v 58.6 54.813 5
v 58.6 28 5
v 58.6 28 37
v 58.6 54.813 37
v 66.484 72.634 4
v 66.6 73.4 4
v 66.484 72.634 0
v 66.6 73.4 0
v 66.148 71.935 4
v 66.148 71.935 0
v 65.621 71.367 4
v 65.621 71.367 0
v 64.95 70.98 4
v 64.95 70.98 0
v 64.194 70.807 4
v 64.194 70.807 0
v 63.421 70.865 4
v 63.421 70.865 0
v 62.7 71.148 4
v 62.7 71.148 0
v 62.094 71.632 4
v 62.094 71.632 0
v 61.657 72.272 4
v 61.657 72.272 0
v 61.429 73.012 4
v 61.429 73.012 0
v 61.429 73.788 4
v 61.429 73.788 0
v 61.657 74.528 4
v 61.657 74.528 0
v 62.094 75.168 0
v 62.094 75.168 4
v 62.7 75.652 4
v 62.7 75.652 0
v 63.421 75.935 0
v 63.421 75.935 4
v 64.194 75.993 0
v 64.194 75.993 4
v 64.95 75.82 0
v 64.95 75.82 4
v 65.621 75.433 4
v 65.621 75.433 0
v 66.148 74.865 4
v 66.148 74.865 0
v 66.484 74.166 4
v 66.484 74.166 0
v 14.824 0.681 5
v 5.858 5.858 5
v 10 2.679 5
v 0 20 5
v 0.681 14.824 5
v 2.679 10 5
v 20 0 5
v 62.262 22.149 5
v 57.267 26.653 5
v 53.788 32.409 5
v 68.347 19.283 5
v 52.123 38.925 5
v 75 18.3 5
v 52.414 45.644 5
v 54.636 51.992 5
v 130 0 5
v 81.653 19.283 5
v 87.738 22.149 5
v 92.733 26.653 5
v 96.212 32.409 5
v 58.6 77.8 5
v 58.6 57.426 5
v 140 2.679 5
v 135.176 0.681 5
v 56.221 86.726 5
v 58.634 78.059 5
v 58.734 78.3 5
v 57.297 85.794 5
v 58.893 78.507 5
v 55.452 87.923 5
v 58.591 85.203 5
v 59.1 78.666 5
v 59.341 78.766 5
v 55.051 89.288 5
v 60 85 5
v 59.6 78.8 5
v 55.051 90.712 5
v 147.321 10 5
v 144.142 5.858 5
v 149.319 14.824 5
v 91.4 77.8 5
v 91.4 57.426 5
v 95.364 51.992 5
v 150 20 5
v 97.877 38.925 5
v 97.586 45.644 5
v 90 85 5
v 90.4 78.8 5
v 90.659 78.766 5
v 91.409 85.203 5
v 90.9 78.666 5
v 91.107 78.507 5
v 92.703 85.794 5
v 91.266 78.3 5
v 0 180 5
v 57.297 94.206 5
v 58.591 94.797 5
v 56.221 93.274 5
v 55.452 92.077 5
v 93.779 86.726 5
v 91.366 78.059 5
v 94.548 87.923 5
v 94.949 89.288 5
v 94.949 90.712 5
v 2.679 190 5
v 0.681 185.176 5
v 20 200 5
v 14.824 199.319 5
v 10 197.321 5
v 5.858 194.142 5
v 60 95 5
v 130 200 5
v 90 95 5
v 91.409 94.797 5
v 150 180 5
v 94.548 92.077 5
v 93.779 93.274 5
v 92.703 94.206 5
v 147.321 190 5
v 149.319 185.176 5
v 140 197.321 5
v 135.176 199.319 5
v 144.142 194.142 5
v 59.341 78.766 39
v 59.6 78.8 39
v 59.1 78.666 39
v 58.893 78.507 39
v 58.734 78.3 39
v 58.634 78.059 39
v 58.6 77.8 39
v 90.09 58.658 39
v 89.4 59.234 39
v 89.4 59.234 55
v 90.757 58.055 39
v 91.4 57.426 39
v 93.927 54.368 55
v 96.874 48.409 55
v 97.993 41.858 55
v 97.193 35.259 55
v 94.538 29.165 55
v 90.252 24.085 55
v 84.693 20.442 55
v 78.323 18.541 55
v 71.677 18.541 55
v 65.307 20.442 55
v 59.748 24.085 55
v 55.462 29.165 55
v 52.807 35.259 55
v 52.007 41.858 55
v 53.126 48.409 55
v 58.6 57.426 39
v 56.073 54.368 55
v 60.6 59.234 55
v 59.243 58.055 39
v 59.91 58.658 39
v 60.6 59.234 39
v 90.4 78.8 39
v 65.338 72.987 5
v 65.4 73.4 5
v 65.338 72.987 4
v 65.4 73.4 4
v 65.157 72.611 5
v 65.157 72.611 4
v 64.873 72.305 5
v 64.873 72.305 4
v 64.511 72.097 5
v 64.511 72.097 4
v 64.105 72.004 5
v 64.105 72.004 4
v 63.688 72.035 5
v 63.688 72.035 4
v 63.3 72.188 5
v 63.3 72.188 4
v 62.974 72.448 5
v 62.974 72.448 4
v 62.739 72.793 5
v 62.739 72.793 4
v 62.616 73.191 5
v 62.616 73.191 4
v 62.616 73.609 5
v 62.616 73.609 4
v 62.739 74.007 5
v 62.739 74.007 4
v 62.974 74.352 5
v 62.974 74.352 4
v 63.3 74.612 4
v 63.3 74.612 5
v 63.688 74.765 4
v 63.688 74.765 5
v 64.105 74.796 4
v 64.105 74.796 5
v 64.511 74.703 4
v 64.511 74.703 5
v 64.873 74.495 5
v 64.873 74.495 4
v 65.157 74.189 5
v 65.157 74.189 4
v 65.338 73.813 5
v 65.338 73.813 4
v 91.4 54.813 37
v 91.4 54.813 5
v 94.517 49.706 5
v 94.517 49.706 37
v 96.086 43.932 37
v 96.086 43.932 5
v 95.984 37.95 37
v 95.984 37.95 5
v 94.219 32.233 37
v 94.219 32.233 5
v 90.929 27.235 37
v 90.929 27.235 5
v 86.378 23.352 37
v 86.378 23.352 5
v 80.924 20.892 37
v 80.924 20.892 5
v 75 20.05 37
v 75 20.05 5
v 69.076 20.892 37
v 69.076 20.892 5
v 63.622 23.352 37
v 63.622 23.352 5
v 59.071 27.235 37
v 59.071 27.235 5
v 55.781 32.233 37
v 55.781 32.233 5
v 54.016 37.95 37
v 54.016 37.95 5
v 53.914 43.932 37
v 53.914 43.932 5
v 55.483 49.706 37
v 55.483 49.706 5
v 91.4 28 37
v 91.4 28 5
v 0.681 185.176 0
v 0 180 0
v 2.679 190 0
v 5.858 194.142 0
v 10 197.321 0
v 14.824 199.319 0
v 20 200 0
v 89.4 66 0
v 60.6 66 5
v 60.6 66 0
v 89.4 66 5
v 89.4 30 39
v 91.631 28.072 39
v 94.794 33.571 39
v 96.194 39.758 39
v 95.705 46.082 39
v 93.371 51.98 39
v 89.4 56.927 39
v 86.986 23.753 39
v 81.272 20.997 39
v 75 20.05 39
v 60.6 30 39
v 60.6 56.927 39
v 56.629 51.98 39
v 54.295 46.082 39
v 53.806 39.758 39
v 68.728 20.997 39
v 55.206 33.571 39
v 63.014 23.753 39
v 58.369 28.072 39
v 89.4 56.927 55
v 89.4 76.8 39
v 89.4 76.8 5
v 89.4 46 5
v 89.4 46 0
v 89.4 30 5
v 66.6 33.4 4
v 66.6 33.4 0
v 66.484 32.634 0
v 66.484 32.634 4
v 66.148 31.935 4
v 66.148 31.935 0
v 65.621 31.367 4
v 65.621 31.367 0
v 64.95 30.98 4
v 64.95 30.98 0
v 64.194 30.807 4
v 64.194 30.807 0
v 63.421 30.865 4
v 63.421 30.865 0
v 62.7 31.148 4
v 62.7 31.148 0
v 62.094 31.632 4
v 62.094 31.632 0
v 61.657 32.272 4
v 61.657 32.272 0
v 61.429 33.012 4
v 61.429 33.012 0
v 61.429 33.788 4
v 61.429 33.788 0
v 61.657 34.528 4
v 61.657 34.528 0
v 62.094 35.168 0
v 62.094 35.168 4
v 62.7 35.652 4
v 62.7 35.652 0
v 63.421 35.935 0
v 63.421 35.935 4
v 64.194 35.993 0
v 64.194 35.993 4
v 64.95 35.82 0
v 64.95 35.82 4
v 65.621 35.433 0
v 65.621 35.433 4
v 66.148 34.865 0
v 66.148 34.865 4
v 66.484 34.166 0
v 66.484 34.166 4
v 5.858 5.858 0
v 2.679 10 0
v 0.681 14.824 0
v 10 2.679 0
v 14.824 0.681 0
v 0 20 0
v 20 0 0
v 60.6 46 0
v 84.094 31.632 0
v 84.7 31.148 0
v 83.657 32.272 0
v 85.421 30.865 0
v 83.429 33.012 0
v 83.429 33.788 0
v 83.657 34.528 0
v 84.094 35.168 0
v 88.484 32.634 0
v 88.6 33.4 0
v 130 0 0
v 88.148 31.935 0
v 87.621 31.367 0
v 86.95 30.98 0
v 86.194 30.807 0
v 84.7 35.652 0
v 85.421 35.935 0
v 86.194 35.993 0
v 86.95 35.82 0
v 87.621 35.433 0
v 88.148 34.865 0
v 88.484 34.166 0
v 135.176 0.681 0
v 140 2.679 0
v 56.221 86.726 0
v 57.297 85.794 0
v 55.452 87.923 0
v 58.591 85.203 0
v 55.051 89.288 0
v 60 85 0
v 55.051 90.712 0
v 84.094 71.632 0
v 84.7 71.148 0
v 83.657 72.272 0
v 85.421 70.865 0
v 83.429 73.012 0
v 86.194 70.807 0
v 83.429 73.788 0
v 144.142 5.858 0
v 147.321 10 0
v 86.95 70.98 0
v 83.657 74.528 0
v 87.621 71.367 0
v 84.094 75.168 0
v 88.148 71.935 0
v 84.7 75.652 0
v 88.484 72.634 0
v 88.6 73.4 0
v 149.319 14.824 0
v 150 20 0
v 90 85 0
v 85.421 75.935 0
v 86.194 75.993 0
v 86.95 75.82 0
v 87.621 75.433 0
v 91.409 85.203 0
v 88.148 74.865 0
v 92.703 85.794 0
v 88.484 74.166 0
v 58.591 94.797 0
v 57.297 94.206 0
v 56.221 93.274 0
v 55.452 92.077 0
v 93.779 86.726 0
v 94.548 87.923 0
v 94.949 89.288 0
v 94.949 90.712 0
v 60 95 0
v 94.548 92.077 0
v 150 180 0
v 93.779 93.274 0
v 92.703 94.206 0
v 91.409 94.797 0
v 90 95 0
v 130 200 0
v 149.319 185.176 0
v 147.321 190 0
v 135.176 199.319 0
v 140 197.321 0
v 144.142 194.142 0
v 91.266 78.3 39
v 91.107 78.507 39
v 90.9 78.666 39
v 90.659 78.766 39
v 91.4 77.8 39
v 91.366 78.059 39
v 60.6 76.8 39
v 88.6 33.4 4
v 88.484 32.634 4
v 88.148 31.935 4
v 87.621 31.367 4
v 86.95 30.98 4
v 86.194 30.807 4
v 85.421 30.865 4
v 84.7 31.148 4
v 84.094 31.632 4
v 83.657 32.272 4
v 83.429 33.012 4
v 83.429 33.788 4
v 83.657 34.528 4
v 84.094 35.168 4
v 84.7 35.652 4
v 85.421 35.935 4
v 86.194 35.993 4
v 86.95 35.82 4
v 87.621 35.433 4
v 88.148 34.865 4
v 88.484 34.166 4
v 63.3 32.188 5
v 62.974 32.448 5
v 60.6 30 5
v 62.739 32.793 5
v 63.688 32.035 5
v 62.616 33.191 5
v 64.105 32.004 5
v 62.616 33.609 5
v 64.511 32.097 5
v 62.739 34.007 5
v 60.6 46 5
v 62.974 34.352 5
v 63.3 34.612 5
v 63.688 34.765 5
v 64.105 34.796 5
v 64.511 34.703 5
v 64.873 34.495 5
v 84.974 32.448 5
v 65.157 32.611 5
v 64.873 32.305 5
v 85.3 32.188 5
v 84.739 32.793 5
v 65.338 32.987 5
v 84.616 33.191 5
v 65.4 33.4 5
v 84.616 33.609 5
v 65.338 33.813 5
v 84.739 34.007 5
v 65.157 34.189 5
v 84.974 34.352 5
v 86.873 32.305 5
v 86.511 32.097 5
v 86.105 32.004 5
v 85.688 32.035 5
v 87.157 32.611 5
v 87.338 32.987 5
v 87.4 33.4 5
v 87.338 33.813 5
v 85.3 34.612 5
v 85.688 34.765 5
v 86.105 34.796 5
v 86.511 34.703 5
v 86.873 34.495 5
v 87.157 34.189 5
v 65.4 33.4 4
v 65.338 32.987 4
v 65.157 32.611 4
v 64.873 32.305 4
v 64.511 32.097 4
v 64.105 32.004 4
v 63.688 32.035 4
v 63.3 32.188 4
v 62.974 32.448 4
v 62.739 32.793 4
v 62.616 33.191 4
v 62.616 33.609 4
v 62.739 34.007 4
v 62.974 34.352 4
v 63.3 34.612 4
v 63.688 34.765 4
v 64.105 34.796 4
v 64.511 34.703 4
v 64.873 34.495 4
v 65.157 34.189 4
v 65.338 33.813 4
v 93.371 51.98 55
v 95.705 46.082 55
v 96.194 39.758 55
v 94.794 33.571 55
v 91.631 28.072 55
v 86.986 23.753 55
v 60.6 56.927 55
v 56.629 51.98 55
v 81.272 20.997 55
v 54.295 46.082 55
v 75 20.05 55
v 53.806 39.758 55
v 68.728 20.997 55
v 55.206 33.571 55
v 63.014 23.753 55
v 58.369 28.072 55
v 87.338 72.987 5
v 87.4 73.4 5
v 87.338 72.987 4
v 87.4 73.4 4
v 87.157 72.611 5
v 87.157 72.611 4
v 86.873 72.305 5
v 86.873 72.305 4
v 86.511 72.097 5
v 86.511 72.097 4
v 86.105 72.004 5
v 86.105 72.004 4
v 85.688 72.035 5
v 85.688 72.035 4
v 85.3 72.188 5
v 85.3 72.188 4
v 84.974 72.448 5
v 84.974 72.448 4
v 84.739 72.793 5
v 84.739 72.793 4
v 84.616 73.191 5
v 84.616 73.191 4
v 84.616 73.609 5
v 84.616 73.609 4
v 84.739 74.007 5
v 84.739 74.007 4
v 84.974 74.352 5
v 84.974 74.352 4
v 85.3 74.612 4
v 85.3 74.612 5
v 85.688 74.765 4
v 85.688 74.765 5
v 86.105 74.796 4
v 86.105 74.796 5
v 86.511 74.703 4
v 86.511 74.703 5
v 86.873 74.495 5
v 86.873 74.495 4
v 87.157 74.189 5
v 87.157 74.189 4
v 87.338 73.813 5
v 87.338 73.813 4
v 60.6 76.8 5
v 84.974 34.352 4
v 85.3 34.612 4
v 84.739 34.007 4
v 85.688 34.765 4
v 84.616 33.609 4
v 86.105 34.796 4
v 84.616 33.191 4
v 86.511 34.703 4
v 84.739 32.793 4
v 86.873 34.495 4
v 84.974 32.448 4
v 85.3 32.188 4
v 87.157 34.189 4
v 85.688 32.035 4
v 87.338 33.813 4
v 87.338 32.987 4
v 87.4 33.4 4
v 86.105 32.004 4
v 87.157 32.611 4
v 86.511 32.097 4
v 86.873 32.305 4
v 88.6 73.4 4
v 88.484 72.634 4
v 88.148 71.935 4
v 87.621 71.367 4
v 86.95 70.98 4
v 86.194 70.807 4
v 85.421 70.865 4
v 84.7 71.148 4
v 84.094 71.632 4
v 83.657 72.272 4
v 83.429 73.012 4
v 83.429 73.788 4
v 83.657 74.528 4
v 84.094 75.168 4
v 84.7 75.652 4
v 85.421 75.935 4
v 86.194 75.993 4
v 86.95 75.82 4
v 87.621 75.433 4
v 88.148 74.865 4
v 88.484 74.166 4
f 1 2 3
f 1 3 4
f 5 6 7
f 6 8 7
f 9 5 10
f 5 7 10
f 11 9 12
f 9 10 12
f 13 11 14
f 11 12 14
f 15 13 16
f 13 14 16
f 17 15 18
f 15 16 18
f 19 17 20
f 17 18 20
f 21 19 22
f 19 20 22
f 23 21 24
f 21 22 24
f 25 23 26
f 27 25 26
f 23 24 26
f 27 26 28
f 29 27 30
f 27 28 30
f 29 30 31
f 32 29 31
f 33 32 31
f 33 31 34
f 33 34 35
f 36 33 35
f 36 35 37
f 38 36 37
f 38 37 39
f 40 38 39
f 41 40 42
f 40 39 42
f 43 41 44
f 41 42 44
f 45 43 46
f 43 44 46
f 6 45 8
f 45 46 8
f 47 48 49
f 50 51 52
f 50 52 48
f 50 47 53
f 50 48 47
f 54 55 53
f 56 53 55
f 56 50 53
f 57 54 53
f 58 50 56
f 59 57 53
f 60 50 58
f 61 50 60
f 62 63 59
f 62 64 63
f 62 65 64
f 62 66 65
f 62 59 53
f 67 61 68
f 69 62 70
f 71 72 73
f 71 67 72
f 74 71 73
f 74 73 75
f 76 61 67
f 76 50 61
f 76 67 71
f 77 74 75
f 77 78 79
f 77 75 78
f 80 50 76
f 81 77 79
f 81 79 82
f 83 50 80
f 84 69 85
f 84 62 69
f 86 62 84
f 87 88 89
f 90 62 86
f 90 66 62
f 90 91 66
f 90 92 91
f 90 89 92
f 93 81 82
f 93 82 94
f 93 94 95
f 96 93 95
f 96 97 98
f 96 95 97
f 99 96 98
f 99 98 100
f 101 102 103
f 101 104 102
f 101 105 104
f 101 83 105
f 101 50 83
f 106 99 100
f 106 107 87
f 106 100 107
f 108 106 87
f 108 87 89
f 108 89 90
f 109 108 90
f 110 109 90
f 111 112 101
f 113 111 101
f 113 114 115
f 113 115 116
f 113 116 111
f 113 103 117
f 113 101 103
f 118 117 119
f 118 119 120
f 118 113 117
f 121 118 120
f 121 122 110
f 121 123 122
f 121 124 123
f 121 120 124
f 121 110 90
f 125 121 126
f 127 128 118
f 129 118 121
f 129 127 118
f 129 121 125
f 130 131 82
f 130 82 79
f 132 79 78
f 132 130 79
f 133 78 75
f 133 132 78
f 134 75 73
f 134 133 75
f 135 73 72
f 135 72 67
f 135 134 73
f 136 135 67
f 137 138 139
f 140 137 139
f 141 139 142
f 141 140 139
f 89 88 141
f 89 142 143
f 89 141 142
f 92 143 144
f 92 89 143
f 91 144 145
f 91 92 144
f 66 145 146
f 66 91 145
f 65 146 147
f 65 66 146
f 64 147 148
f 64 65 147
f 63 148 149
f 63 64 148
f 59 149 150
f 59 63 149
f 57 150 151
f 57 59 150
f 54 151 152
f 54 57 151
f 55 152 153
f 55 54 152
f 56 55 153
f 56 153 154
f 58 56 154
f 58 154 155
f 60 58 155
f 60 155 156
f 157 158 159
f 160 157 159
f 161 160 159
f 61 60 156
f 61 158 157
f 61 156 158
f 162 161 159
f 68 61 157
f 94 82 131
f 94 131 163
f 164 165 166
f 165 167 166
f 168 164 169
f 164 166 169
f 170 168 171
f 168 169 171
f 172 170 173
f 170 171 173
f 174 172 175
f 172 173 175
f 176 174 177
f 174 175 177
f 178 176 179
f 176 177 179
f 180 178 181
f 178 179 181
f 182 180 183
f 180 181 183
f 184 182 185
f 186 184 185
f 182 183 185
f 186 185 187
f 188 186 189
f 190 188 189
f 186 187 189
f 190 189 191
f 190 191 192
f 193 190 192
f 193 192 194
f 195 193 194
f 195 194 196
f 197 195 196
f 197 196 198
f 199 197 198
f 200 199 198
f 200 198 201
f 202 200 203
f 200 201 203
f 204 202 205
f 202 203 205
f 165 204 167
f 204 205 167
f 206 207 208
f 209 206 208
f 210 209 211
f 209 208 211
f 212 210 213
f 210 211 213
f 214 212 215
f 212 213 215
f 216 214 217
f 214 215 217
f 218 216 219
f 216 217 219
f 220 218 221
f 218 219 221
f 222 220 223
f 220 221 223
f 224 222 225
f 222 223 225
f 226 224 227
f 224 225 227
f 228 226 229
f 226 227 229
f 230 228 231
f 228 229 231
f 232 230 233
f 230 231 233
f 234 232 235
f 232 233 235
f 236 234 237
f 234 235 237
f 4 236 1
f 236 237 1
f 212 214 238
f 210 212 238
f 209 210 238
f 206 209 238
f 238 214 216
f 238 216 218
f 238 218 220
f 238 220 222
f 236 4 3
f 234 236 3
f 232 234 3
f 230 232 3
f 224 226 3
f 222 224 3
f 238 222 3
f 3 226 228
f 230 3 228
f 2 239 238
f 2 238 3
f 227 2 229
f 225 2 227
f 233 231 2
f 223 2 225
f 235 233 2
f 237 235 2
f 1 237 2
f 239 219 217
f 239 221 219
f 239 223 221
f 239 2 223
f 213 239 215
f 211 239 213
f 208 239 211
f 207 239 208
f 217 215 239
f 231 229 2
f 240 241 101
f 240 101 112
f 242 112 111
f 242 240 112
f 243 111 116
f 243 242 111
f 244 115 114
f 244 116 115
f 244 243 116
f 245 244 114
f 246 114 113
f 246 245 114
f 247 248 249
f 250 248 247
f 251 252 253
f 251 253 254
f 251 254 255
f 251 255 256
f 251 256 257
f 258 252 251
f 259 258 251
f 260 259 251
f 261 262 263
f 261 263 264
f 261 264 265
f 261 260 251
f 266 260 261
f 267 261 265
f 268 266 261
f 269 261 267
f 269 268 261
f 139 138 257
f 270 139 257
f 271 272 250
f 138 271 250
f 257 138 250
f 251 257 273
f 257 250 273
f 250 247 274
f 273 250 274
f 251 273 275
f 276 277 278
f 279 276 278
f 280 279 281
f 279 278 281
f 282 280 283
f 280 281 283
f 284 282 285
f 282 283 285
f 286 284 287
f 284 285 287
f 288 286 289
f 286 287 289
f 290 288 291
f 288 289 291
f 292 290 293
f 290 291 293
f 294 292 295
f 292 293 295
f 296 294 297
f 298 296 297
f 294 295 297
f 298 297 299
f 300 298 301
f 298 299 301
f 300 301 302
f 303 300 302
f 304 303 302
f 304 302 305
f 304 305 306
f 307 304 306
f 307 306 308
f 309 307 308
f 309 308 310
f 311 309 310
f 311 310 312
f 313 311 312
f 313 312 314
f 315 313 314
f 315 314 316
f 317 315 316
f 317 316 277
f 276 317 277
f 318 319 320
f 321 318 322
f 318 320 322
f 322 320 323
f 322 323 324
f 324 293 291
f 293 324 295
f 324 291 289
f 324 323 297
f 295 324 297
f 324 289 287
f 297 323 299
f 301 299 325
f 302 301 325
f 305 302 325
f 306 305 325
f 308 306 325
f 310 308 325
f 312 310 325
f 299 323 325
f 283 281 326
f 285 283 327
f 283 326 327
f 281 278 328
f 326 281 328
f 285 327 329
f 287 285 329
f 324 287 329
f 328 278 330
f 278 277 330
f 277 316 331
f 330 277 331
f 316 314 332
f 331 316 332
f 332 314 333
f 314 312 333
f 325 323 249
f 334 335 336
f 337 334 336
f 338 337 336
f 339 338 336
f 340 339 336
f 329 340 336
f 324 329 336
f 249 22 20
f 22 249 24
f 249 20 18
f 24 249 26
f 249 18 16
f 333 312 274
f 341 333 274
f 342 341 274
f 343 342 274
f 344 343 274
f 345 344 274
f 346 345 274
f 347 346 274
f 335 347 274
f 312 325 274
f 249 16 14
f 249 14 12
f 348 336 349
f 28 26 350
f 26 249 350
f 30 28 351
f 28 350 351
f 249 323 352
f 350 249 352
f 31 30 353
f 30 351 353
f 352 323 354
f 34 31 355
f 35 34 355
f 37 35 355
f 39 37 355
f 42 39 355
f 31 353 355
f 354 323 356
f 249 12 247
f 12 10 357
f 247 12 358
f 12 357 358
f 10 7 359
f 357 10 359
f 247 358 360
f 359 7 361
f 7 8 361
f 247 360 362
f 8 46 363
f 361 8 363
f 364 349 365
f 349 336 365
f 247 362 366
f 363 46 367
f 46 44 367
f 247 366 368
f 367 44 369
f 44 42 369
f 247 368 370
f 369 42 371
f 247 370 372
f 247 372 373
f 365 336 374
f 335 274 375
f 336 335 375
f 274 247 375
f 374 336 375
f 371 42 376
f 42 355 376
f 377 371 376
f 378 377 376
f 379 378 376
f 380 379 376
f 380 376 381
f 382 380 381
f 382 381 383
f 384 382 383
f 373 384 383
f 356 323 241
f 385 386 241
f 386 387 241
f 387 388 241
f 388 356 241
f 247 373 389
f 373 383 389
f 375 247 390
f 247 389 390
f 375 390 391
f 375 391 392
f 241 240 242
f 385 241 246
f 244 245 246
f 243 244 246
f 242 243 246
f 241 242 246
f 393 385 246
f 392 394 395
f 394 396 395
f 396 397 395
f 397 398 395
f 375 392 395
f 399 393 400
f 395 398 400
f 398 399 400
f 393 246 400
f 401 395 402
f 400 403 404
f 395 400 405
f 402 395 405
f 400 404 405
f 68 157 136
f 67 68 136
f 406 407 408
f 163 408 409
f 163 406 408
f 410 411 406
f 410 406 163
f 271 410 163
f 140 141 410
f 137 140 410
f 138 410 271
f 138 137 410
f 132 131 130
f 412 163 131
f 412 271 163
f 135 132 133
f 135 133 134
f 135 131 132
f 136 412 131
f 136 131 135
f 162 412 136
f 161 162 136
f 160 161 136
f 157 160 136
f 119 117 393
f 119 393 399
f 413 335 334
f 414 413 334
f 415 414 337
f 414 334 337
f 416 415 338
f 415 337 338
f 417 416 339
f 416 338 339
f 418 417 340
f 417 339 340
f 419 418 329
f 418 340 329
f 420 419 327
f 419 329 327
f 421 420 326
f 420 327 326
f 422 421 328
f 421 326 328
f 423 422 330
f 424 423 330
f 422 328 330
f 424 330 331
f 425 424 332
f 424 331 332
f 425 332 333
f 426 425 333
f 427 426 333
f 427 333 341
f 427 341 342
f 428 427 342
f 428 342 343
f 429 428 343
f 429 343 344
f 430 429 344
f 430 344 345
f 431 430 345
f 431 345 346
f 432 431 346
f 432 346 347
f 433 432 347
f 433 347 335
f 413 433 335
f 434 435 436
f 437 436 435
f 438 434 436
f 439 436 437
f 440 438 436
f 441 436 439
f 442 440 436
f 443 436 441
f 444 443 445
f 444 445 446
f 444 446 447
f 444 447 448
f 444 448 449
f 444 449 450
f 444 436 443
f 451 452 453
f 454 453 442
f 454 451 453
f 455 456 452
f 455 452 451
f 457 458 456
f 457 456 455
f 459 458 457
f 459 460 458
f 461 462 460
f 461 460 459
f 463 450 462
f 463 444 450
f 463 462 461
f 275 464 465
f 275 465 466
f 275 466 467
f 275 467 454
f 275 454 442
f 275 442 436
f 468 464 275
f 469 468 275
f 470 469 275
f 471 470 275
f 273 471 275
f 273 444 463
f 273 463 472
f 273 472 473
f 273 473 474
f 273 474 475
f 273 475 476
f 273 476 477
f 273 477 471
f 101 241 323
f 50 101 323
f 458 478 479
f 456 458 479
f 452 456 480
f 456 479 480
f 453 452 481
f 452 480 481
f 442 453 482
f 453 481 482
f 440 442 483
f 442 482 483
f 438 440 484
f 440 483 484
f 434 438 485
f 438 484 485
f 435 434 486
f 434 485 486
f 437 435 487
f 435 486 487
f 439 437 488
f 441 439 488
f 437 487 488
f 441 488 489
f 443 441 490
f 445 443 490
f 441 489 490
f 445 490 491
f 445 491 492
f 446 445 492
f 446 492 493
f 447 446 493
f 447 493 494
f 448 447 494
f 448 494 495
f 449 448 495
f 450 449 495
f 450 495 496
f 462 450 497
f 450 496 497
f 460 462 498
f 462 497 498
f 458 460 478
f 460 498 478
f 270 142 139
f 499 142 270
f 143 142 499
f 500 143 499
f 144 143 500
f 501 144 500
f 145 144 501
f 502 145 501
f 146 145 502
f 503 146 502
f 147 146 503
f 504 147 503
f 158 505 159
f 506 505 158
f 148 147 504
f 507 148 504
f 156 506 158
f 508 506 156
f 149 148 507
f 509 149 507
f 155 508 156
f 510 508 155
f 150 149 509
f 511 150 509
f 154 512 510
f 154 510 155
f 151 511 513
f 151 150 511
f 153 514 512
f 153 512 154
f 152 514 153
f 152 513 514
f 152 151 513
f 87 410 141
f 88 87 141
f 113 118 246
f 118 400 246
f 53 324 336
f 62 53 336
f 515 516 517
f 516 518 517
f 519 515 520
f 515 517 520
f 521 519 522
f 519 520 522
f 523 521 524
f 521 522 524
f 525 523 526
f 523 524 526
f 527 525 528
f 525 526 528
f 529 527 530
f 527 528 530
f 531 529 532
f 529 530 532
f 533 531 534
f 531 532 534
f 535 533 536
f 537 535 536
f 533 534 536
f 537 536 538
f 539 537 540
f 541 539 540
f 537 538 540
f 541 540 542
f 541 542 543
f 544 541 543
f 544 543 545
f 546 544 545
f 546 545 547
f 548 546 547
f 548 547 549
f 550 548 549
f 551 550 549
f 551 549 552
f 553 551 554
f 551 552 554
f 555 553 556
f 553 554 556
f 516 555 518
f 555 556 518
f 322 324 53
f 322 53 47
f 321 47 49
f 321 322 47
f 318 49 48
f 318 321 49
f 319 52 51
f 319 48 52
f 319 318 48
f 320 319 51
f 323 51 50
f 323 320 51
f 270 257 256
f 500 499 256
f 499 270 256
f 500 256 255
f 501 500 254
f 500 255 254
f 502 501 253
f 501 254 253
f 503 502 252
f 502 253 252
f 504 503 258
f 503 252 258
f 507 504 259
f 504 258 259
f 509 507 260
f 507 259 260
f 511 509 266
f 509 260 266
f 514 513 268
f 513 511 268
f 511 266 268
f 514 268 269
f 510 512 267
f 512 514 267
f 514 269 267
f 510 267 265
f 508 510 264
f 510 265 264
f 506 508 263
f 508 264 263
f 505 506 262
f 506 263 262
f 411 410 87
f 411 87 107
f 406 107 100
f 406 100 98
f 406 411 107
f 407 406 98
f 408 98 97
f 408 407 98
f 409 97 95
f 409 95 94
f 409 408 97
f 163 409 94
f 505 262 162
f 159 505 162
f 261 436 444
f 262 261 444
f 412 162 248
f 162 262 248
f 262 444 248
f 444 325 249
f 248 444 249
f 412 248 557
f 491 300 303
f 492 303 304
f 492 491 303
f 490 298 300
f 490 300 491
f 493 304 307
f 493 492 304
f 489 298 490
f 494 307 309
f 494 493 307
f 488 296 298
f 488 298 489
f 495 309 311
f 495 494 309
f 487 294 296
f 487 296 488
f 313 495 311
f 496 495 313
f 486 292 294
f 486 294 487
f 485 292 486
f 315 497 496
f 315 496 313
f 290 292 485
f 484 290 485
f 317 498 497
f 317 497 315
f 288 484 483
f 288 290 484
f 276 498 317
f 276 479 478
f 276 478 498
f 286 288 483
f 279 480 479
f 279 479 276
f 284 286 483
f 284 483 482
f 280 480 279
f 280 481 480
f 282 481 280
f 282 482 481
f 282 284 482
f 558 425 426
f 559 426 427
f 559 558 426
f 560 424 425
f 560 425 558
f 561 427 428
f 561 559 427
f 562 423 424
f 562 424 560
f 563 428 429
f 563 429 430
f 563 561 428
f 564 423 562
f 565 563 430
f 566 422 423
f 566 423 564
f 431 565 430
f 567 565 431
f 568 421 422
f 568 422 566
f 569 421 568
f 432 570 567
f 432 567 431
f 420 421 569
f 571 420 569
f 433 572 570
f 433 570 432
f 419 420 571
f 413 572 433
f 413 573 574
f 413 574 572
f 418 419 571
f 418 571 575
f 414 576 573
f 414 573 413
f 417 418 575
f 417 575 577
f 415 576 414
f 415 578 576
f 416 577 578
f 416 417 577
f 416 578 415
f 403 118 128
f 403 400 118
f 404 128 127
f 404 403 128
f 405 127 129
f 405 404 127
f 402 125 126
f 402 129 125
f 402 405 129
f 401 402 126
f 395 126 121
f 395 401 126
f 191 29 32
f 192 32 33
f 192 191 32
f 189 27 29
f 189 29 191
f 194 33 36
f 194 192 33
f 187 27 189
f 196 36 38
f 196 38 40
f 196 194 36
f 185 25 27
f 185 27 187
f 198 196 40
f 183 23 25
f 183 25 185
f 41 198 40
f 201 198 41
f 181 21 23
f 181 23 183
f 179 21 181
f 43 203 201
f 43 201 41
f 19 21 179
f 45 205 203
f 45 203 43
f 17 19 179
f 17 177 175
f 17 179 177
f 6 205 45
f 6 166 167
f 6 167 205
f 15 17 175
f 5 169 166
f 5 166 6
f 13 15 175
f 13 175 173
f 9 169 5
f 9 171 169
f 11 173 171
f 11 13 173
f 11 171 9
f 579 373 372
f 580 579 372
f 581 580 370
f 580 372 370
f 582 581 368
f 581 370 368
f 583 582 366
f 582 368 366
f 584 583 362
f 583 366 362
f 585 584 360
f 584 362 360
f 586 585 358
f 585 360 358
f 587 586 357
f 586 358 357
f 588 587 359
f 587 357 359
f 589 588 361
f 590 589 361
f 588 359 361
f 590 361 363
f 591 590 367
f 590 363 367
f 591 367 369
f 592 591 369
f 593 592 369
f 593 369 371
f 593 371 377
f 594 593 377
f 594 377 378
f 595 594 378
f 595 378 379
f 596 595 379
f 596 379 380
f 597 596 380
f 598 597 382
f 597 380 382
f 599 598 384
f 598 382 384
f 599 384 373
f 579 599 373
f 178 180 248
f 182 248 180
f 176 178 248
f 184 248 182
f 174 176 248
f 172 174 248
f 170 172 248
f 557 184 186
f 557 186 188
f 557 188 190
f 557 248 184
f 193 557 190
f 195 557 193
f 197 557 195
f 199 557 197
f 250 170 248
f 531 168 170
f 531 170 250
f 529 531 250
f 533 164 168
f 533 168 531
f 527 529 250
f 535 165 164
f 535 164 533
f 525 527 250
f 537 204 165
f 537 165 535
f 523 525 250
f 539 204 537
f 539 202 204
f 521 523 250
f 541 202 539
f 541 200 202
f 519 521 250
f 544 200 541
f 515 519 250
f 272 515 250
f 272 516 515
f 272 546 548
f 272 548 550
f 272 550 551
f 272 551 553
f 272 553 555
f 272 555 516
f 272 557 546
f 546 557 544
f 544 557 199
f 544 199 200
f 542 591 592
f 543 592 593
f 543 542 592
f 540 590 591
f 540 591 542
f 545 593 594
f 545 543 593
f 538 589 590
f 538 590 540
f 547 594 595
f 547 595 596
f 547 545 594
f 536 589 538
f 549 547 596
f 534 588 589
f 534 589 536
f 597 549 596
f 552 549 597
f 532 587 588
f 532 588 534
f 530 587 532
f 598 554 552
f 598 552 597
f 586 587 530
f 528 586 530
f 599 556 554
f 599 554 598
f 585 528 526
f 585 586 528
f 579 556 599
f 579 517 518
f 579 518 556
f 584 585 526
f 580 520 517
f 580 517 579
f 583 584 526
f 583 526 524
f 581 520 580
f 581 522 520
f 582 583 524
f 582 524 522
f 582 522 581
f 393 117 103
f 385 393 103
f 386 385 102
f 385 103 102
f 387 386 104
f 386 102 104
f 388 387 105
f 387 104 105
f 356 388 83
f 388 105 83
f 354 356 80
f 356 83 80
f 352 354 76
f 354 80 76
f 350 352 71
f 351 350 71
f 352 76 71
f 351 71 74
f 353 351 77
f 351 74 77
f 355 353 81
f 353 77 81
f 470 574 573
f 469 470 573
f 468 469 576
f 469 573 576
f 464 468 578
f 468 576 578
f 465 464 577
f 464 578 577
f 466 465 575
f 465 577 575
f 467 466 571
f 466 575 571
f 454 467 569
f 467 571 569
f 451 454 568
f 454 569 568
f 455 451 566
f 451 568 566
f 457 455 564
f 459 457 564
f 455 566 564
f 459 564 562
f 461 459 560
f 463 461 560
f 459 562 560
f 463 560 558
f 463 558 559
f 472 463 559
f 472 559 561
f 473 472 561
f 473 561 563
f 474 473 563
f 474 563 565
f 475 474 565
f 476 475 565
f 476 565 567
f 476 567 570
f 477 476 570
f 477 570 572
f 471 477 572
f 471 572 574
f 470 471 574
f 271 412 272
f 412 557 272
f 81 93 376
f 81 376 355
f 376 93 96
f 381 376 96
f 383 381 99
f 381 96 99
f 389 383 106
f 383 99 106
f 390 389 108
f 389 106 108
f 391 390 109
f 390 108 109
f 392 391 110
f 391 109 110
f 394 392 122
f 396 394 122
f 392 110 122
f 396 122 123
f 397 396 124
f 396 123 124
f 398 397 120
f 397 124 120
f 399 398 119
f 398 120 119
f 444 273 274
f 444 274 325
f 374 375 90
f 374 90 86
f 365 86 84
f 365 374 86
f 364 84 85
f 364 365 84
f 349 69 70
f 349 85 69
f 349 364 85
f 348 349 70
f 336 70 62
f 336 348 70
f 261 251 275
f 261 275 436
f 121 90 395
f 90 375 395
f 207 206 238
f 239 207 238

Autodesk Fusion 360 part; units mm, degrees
sketch "スケッチ1" plane through (0, 0, 0) normal (0, 0, 1) x (1, 0, 0)
  line L0 (20, 0) -> (130, 0)
  line L1 (150, 20) -> (150, 180)
  line L2 (130, 200) -> (20, 200)
  line L3 (0, 180) -> (0, 20)
  arc A0 (20, 200) -> (0, 180) centre (20, 180) ccw
  arc A1 (150, 180) -> (130, 200) centre (130, 180) ccw
  arc A2 (0, 20) -> (20, 0) centre (20, 20) ccw
  arc A3 (130, 0) -> (150, 20) centre (130, 20) ccw
  point P0 (150, 0)
  point P1 (0, 200)
  dimension "d1" = 150
  dimension "d2" = 200
  dimension "d5" = 20
  dimension "d6" = 20
  dimension "d7" = 20
  dimension "d8" = 20
extrude "押し出し1" add sketch "スケッチ1" along normal blind 5
sketch "スケッチ2" plane through (0, 0, 5) normal (0, 0, 1) x (-1, 0, 0)
  arc A0 (-130, 0) -> (-150, -20) centre (-130, -20) ccw
  arc A1 (-150, -180) -> (-130, -200) centre (-130, -180) ccw
  line L0 (-130, -200) -> (-20, -200)
  arc A2 (-20, -200) -> (0, -180) centre (-20, -180) ccw
  arc A3 (0, -20) -> (-20, 0) centre (-20, -20) ccw
  line L1 (-20, 0) -> (-130, 0)
  line L2 (-89.4, -30) -> (-60.6, -30)
  line L3 (-60.6, -30) -> (-60.6, -76.8)
  line L4 (-60.6, -76.8) -> (-89.4, -76.8)
  line L5 (-89.4, -76.8) -> (-89.4, -30)
  line L6 (-91.4, -28) -> (-58.6, -28)
  line L7 (-58.6, -28) -> (-58.6, -78.8)
  line L8 (-58.6, -78.8) -> (-91.4, -78.8)
  line L9 (-91.4, -78.8) -> (-91.4, -28)
  line L10 (0, -180) -> (0, -20)
  dimension "d9" = 28.8
  dimension "d10" = 46.8
  dimension "d11" = 150
  dimension "d12" = 200
  dimension "d13" = 60.6
  dimension "d14" = 30
  dimension "d15" = 32.8
  dimension "d16" = 50.8
  dimension "d17" = 58.6
  dimension "d18" = 28
extrude "押し出し2" add sketch "スケッチ2" along normal blind 34
sketch "スケッチ3" plane through (0, 0, 39) normal (0, 0, 1) x (-1, 0, 0)
  line L0 (-60.6, -76.8) -> (-89.4, -76.8)
  line L1 (-89.4, -76.8) -> (-89.4, -30)
  line L2 (-89.4, -30) -> (-60.6, -30)
  line L3 (-60.6, -30) -> (-60.6, -76.8)
  line L4 (-91.4, -78.8) -> (-58.6, -78.8)
  line L5 (-58.6, -78.8) -> (-58.6, -28)
  line L6 (-58.6, -28) -> (-91.4, -28)
  line L7 (-91.4, -28) -> (-91.4, -78.8)
  circle A0 centre (-75, -41.3) radius 21.25
  circle A1 centre (-75, -41.3) radius 23
  dimension "d21" = 42.5
  dimension "d22" = 11.3
  dimension "d23" = 46
extrude "押し出し3" add sketch "スケッチ3" against normal blind 2 contours L5 L6 L7 A0
extrude "押し出し4" add sketch "スケッチ3" along normal blind 16 and the other way blind 34 contours L3 L5 A0 A1 | L1 L7 A0 A1 | L5 L7 A0 A1
fillet "フィレット1" radius 1 1 edges at (91.4, 78.8, 22)
fillet "フィレット2" radius 1 1 edges at (58.6, 78.8, 22)
sketch "スケッチ4" plane through (0, 0, 5) normal (0, 0, 1) x (-1, 0, 0)
  line L0 (-60.6, -76.8) -> (-60.6, -30)
  line L1 (-60.6, -30) -> (-89.4, -30)
  line L2 (-89.4, -30) -> (-89.4, -76.8)
  line L3 (-89.4, -76.8) -> (-60.6, -76.8)
  line L4 (-89.4, -46) -> (-60.6, -46)
  line L5 (-60.6, -46) -> (-60.6, -66)
  line L6 (-60.6, -66) -> (-89.4, -66)
  line L7 (-89.4, -66) -> (-89.4, -46)
  dimension "d35" = 16
  dimension "d36" = 20
extrude "押し出し5" cut sketch "スケッチ4" against normal up to surface (5 mm away) contours L0 L2 L4 L5 L6 L7
sketch "スケッチ5" plane through (0, 0, 0) normal (0, 0, -1) x (1, 0, 0)
  line L0 (89.4, -46) -> (89.4, -66)
  line L1 (89.4, -66) -> (60.6, -66)
  line L2 (60.6, -66) -> (60.6, -46)
  line L3 (60.6, -46) -> (89.4, -46)
  arc A0 (150, -20) -> (130, 0) centre (130, -20) ccw
  line L4 (130, 0) -> (20, 0)
  arc A1 (20, 0) -> (0, -20) centre (20, -20) ccw
  line L5 (0, -20) -> (0, -180)
  arc A2 (0, -180) -> (20, -200) centre (20, -180) ccw
  line L6 (20, -200) -> (130, -200)
  arc A3 (130, -200) -> (150, -180) centre (130, -180) ccw
  line L7 (150, -180) -> (150, -20)
  circle A4 centre (64, -33.4) radius 2.6
  circle A5 centre (86, -73.4) radius 2.6
  circle A6 centre (86, -33.4) radius 2.6
  circle A7 centre (64, -73.4) radius 2.6
  line L8 (75, -25) -> (75, -85)
  line L9 (89.4, -30) -> (60.6, -30)
  line L10 (60.6, -76.8) -> (89.4, -76.8)
  circle A8 centre (64, -33.4) radius 1.4
  circle A9 centre (86, -33.4) radius 1.4
  circle A10 centre (64, -73.4) radius 1.4
  circle A11 centre (86, -73.4) radius 1.4
  dimension "d39" = 5.2
  dimension "d40" = 5.2
  dimension "d41" = 5.2
  dimension "d42" = 5.2
  dimension "d43" = 22
  dimension "d44" = 22
  dimension "d45" = 40
  dimension "d46" = 40
  dimension "d47" = 75
  dimension "d48" = 11
  dimension "d49" = 11
  dimension "d50" = 46.8
  dimension "d51" = 3.4
  dimension "d52" = 3.4
  dimension "d53" = 2.8
  dimension "d54" = 2.8
  dimension "d55" = 2.8
  dimension "d56" = 2.8
extrude "押し出し6" cut sketch "スケッチ5" against normal blind 5 contours A8 | A9 | A10 | A11
extrude "押し出し7" cut sketch "スケッチ5" against normal blind 4 contours A4 | A5 | A6 | A7
sketch "スケッチ6" plane through (0, 0, 5) normal (0, 0, 1) x (-1, 0, 0)
  arc A0 (-58.6, -57.4258) -> (-91.4, -57.4258) centre (-75, -41.3) ccw
  line L0 (-58.6, -57.4258) -> (-58.6, -77.8)
  arc A1 (-59.6, -78.8) -> (-58.6, -77.8) centre (-59.6, -77.8) ccw
  line L1 (-59.6, -78.8) -> (-90.4, -78.8)
  arc A2 (-91.4, -77.8) -> (-90.4, -78.8) centre (-90.4, -77.8) ccw
  line L2 (-91.4, -77.8) -> (-91.4, -57.4258)
  arc A3 (-130, 0) -> (-150, -20) centre (-130, -20) ccw
  line L3 (-150, -20) -> (-150, -180)
  arc A4 (-150, -180) -> (-130, -200) centre (-130, -180) ccw
  line L4 (-130, -200) -> (-20, -200)
  arc A5 (-20, -200) -> (0, -180) centre (-20, -180) ccw
  line L5 (0, -180) -> (0, -20)
  arc A6 (0, -20) -> (-20, 0) centre (-20, -20) ccw
  line L6 (-20, 0) -> (-130, 0)
  circle A7 centre (-90, -90) radius 5
  circle A8 centre (-60, -90) radius 5
  line L7 (-90, -85) -> (-60, -85)
  line L8 (-60, -85) -> (-60, -95)
  line L9 (-60, -95) -> (-90, -95)
  line L10 (-90, -95) -> (-90, -85)
  dimension "d61" = 10
  dimension "d62" = 10
extrude "押し出し8" cut sketch "スケッチ6" against normal blind 5 contours A7 L10 | A7 A8 L7 L9 | A7 L10 | A8 L8 | A8 L8
equation "d13 = ( 150 mm - d9 ) / 2"
equation "d15 = d9 + 4 mm"
equation "d16 = d10 + 4 mm"
equation "d17 = ( d11 - d15 ) / 2"
equation "d18 = d14 - 2 mm"
equation "d44 = d43"
equation "d46 = d45"
equation "d48 = d43 / 2"
equation "d49 = d48"
equation "d51 = ( d50 - d45 ) / 2"
equation "d52 = d51"
